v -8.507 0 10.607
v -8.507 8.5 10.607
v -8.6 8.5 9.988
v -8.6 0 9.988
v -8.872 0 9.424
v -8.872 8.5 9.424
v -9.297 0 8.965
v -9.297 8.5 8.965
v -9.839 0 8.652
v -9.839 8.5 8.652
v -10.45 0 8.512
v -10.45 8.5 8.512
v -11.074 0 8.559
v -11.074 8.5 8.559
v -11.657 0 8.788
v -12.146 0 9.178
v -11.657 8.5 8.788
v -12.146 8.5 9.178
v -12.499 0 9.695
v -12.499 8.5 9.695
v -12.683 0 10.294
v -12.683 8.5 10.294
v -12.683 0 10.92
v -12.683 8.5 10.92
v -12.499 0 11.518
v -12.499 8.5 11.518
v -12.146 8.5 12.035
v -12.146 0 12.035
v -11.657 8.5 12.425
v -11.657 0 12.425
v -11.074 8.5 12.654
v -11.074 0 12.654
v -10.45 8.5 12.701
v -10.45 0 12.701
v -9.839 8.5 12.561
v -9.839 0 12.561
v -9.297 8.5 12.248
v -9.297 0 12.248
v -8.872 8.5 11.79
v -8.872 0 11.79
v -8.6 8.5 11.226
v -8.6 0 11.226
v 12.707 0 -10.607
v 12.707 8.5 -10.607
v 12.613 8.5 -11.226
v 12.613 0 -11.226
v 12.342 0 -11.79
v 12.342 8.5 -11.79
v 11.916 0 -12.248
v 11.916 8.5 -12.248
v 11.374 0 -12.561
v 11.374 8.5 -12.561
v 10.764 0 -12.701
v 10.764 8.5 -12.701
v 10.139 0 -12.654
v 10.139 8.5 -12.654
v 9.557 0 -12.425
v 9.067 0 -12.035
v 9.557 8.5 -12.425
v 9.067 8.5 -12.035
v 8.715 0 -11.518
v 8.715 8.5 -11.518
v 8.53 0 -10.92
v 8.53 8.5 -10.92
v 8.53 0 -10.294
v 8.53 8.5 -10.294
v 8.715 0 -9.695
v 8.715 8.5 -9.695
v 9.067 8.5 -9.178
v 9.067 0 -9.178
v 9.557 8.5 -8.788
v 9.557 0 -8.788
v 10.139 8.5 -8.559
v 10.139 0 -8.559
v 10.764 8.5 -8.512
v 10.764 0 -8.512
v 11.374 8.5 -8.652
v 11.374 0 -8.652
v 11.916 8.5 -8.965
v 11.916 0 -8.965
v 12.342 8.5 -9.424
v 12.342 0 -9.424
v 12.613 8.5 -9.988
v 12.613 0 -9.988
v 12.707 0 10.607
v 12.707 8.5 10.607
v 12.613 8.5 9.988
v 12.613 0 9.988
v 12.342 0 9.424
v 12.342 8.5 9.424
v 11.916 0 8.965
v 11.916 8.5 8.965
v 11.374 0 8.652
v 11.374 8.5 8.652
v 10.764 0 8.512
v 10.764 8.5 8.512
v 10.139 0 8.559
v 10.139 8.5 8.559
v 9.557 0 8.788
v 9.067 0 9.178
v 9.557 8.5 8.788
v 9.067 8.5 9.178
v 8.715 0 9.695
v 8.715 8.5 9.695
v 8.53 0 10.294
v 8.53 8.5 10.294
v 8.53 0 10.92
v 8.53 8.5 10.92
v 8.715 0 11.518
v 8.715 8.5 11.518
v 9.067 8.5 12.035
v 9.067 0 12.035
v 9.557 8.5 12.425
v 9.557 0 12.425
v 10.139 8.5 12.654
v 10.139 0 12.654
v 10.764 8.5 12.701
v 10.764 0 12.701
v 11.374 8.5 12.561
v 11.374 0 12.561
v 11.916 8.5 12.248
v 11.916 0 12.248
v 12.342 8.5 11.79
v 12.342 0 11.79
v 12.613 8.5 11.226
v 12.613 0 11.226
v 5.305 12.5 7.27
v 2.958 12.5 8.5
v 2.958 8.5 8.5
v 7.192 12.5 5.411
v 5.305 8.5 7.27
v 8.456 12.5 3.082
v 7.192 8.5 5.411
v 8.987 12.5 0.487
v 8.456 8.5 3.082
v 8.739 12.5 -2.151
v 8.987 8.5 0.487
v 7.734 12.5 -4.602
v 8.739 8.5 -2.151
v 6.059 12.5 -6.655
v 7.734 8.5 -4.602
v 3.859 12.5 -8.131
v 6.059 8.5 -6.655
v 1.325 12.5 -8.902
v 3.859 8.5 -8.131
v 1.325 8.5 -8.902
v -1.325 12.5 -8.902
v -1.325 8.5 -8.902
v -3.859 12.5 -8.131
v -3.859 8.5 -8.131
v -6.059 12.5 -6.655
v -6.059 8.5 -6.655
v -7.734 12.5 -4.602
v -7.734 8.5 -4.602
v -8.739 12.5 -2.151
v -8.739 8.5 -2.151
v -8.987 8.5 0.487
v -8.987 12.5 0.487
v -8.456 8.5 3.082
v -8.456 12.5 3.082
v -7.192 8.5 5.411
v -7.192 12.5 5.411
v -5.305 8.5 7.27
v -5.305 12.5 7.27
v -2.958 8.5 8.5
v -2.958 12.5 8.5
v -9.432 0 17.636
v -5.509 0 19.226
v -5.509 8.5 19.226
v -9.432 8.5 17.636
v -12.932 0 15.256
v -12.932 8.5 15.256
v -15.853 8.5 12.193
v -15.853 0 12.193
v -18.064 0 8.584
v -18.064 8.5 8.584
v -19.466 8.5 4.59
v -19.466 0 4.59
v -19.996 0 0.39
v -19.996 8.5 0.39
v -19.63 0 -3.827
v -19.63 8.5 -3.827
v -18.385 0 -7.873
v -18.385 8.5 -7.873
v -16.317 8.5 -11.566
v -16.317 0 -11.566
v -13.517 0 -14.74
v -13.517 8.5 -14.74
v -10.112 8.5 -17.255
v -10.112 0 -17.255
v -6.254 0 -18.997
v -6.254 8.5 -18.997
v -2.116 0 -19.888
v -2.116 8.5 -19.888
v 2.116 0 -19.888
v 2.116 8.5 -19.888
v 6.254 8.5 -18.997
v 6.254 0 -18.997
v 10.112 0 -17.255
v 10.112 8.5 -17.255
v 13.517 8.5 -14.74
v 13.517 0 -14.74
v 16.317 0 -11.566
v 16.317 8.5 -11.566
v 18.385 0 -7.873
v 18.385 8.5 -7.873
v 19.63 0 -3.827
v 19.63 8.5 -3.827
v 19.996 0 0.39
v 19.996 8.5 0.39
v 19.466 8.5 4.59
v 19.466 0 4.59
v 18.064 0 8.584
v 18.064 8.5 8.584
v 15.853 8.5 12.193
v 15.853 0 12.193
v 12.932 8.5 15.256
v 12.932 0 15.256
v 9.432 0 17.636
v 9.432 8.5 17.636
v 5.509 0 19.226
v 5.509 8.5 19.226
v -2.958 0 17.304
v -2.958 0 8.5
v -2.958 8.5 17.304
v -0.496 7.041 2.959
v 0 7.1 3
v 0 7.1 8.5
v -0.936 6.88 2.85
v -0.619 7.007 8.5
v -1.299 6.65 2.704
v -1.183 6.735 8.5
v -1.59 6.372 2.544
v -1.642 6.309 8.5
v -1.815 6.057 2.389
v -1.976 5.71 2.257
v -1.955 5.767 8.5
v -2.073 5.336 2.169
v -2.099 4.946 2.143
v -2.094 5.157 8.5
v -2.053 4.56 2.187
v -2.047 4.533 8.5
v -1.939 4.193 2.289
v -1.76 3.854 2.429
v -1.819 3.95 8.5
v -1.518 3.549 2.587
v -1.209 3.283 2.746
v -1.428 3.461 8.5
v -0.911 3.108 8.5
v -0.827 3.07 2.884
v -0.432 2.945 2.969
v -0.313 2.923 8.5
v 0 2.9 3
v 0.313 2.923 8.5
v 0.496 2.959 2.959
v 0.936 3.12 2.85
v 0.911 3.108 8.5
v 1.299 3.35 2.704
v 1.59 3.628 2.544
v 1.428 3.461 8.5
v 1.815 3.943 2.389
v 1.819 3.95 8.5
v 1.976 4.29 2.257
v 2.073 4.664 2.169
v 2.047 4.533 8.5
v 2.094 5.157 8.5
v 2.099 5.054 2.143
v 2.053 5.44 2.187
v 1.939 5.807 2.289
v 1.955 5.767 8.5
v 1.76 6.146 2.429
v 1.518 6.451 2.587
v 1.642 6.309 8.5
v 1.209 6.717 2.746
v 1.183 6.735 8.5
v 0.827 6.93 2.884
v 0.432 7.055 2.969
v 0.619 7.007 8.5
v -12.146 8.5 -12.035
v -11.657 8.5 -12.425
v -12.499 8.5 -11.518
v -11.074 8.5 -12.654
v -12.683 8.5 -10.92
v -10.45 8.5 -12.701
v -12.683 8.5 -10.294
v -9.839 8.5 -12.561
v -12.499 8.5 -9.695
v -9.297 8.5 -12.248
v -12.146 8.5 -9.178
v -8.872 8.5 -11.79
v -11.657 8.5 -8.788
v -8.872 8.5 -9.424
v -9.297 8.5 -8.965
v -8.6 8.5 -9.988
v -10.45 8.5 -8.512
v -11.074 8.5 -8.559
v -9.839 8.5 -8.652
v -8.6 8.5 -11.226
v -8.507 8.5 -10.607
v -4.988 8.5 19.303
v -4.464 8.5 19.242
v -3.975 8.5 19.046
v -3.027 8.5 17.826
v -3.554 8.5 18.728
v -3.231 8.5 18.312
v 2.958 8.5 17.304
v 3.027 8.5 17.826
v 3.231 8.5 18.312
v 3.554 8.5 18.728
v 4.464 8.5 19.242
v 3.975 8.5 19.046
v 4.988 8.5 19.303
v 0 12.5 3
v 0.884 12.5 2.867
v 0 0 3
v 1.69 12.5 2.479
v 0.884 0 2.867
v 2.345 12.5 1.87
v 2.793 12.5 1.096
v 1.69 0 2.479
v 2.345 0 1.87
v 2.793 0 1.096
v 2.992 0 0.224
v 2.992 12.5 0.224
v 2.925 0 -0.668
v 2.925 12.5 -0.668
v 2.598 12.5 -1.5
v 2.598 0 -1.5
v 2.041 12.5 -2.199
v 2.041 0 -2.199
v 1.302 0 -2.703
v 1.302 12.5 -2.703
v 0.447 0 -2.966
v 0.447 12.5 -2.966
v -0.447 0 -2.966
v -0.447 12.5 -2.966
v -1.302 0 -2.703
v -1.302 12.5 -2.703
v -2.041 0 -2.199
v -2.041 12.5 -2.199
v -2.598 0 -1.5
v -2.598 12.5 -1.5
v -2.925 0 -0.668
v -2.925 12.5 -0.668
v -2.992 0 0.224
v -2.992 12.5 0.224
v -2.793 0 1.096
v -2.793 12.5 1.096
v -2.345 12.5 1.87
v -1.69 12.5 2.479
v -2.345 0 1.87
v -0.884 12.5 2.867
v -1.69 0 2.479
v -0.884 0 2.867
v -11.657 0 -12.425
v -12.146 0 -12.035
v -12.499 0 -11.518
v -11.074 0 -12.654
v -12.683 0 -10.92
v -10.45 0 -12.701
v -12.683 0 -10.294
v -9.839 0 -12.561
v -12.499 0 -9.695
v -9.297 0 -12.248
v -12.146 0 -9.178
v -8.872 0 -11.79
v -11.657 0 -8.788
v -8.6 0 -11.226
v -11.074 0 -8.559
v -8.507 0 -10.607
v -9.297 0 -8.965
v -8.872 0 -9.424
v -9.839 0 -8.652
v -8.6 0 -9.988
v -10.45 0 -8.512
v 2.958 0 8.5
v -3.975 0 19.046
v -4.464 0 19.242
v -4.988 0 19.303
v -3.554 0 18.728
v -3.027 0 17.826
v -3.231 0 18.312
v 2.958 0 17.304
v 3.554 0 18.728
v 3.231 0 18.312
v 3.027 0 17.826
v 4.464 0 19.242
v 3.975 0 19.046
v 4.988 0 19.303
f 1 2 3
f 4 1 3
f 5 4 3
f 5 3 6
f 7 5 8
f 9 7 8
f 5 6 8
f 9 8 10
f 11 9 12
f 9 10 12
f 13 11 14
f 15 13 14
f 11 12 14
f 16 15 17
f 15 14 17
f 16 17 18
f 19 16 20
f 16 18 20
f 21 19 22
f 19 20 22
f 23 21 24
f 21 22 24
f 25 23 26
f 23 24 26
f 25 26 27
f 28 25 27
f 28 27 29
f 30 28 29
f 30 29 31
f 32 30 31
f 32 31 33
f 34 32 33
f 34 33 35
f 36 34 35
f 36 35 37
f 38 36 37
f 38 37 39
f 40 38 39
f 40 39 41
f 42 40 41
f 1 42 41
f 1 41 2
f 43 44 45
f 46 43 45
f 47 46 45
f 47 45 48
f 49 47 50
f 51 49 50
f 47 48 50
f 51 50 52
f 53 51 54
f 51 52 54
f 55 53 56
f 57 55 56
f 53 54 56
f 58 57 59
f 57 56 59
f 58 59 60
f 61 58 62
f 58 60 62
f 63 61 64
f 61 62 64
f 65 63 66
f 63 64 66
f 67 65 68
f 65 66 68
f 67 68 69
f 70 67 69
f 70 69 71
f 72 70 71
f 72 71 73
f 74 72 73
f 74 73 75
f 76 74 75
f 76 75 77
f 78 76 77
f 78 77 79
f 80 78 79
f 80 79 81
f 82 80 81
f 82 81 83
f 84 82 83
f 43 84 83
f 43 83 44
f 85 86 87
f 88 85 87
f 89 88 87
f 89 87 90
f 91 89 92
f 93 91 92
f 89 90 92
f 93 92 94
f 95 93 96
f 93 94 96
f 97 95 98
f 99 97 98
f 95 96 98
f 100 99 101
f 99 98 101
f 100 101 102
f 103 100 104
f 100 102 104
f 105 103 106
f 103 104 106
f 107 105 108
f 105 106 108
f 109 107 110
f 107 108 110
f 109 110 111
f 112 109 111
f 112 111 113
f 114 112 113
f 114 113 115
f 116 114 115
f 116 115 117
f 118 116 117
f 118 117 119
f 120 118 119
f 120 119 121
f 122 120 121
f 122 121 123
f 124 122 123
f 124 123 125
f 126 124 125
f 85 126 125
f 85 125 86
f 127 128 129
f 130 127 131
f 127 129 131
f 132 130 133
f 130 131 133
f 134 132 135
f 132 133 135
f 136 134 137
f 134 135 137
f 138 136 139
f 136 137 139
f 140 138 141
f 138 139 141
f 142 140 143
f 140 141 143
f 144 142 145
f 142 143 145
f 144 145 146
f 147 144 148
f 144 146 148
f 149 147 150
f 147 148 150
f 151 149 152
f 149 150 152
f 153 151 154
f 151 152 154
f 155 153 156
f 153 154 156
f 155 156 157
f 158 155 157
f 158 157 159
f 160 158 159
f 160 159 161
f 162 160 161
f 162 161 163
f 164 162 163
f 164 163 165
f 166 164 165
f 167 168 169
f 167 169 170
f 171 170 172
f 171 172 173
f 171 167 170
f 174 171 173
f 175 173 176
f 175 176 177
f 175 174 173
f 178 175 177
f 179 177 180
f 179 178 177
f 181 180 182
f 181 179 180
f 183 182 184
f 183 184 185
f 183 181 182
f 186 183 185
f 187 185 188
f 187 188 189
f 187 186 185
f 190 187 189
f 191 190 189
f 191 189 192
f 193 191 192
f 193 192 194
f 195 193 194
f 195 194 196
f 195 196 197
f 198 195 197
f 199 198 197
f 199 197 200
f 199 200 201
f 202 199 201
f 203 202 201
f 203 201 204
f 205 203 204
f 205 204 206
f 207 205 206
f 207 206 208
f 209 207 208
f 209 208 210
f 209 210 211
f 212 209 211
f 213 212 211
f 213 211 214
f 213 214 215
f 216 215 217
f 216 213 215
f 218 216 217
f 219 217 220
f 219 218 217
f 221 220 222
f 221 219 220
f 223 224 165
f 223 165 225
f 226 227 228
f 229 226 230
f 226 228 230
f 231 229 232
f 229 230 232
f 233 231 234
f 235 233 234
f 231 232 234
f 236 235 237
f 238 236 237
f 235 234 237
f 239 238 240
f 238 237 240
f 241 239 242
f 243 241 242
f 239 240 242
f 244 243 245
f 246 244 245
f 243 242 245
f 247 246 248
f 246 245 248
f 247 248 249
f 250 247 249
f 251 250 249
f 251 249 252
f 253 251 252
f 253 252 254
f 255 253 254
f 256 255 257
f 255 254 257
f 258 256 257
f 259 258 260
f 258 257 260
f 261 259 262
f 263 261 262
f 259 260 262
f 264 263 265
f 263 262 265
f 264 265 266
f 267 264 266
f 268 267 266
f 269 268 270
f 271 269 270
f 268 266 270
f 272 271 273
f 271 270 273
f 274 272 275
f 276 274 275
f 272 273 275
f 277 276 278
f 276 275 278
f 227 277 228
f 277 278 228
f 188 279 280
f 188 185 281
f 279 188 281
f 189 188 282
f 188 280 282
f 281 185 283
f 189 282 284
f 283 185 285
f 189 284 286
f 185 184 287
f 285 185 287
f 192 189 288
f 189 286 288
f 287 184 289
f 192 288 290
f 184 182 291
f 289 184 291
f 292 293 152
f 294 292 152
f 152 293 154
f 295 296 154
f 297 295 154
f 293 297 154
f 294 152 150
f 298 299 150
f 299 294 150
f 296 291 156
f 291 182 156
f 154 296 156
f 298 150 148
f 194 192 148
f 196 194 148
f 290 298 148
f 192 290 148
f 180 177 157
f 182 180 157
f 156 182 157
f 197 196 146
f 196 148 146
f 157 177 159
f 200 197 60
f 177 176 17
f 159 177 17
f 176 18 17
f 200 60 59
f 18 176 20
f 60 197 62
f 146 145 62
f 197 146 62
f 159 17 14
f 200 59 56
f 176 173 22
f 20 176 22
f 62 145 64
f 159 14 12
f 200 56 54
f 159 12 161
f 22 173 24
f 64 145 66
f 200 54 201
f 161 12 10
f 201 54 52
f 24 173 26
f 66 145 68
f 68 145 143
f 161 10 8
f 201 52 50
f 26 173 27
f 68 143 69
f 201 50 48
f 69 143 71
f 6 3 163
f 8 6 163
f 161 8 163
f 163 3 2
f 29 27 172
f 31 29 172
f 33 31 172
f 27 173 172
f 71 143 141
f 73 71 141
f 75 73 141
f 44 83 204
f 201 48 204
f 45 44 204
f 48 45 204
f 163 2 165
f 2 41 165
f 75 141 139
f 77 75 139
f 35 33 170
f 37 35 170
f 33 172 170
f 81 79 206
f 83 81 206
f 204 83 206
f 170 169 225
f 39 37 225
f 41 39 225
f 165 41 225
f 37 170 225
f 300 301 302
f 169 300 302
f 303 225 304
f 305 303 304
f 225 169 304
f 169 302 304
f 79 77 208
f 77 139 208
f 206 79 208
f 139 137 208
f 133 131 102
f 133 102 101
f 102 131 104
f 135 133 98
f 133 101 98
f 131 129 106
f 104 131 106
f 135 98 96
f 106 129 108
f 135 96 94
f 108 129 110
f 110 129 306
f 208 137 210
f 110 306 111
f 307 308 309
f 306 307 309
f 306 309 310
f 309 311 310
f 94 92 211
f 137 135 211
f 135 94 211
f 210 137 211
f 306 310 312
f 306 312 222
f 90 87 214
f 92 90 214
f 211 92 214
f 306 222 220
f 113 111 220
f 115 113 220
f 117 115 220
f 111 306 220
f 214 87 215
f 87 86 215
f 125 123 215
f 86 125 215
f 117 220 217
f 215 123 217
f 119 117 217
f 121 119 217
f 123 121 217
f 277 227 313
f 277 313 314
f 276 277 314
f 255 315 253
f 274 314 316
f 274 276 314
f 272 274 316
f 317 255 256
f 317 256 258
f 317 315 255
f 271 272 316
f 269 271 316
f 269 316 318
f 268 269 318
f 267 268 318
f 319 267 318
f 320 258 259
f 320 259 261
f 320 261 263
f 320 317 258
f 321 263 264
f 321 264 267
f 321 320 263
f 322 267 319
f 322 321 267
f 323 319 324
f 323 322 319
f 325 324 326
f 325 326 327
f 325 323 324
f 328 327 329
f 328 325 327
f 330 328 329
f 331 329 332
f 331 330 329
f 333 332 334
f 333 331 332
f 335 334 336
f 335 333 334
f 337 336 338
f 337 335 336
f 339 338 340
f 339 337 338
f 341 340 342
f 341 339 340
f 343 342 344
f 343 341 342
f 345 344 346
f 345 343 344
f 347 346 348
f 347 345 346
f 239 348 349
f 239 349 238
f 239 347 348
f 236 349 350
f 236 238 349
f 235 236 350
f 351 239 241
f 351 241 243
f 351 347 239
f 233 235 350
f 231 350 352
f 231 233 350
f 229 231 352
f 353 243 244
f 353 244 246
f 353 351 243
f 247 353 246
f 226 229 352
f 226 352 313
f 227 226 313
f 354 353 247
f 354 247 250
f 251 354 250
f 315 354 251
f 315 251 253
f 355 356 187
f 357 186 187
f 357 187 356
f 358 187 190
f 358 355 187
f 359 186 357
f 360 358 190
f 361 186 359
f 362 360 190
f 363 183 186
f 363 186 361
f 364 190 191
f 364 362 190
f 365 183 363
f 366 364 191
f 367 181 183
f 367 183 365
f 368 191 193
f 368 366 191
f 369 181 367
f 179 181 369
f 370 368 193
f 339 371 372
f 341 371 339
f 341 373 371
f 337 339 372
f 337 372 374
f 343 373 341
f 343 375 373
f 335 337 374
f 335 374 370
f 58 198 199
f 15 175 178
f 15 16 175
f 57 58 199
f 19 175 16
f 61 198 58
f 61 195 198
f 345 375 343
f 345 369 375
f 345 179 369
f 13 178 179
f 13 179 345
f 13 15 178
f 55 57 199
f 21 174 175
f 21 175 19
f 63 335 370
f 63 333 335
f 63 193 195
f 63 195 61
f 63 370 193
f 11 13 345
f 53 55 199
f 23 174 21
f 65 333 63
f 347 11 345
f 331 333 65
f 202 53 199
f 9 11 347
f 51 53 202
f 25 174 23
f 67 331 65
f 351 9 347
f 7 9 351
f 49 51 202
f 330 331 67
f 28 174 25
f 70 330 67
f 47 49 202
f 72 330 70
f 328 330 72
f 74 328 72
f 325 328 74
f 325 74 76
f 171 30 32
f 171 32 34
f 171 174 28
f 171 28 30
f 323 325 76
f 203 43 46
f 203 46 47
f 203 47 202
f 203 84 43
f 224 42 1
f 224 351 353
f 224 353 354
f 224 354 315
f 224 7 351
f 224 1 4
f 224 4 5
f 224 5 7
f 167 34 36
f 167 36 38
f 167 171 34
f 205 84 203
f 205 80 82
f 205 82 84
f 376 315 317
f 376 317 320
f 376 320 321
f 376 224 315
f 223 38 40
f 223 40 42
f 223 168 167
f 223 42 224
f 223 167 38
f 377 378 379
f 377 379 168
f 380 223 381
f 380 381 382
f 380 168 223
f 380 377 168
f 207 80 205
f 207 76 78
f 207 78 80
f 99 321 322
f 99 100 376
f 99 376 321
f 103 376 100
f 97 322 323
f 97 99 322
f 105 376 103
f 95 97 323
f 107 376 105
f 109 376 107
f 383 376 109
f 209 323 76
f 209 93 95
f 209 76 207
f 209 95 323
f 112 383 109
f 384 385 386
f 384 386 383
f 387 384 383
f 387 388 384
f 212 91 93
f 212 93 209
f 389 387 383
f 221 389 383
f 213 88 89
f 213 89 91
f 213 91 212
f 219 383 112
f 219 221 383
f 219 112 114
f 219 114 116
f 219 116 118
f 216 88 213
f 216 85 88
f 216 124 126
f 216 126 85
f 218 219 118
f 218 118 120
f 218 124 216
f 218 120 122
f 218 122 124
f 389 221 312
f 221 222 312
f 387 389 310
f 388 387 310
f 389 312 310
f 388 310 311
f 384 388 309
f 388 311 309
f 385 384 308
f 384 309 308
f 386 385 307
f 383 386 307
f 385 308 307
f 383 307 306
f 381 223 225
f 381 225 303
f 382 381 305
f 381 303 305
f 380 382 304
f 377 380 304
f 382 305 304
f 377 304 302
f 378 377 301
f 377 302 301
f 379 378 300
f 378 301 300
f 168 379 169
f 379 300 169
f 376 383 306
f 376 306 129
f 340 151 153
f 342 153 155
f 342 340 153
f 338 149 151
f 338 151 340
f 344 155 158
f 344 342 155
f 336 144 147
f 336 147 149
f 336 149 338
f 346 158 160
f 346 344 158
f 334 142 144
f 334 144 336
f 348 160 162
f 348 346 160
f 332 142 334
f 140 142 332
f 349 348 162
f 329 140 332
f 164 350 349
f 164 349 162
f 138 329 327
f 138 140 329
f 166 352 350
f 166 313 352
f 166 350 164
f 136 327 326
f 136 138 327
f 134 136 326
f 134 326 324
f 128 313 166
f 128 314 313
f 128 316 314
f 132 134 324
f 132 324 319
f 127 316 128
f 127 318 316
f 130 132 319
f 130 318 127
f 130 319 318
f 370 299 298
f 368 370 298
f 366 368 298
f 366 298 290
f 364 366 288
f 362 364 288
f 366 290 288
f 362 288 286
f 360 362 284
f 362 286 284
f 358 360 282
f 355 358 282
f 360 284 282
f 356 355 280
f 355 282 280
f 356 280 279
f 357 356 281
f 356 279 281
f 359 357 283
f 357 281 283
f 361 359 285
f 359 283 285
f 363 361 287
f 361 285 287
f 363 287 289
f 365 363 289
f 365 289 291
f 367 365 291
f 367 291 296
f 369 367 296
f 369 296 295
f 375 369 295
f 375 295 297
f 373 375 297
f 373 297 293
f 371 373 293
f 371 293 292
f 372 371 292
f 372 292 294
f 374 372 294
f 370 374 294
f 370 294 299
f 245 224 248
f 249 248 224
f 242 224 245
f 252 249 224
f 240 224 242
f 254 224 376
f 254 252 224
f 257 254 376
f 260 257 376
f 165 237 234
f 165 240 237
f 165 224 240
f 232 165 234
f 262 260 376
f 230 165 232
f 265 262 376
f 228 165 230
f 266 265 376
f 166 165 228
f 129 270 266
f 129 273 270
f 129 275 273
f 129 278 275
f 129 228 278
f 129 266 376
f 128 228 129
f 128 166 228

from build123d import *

# Parameters (mm, degrees)
SKETCH1_R                  = 9
SKETCH1_R_2                = 3
BOSS_EXTRUDE1_DEPTH        = 12.5
SKETCH5_W                  = 2.1
SKETCH5_H                  = 9
CUT_EXTRUDE1_START         = 9
SKETCH6_W                  = 18
SKETCH6_H                  = 12.5
CUT_EXTRUDE1_DEPTH         = 0.5
BOSS_EXTRUDE2_DEPTH        = 8.5
FILLET1_R                  = 2
F_4_2_4_2_DIAMETER_HOLE2_D = 4.2


with BuildPart() as part:
    # Sketch1 → Boss-Extrude1 (new body)
    with BuildSketch(Plane(origin=(0, 0, 0), x_dir=(1, 0, 0), z_dir=(0, 1, 0))):
        with Locations(Location((0, 0, 0), (0, 0, 270))):
            Circle(SKETCH1_R)
        with Locations(Location((0, 0, 0), (0, 0, 270))):
            Circle(SKETCH1_R_2, mode=Mode.SUBTRACT)
    extrude(amount=BOSS_EXTRUDE1_DEPTH)

    # Sketch5 → Ø4.2 (4.2) Diameter Hole1 (revolve, cut)
    with BuildSketch(Plane(origin=(0, 5, 0), x_dir=(0, 1, 0), z_dir=(1, 0, 0))):
        with Locations((1.05, 4.5)):
            Rectangle(SKETCH5_W, SKETCH5_H)
    revolve(axis=Axis((0, 5, -6.35), (0, 0, 1)), mode=Mode.SUBTRACT)

    # Sketch6 → Cut-Extrude1 (cut)
    with BuildSketch(Plane.XY.offset(CUT_EXTRUDE1_START)):
        with Locations((0, 6.25)):
            Rectangle(SKETCH6_W, SKETCH6_H)
    extrude(amount=-CUT_EXTRUDE1_DEPTH, mode=Mode.SUBTRACT)

    # Sketch7 → Boss-Extrude2 (add)
    with BuildSketch(Plane.XZ):
        with BuildLine():
            Line((-2.958039892, 8.5), (-2.958039892, 19.780040445))
            ThreePointArc((-2.958039892, 19.780040445), (0, -20), (2.958039892, 19.780040445))
            Line((2.958039892, 19.780040445), (2.958039892, 8.5))
            ThreePointArc((2.958039892, 8.5), (0, -9), (-2.958039892, 8.5))
        make_face()
    extrude(amount=-BOSS_EXTRUDE2_DEPTH)

    # Fillet1
    fillet1_edges = [part.edges().sort_by_distance(p)[0] for p in [
        (-2.958039892, 4.25, 19.780040445),
        (2.958039892, 4.25, 19.780040445),
    ]]
    fillet(fillet1_edges, radius=FILLET1_R)

    # Ø4.2 (4.2) Diameter Hole2 (through all)
    with Locations(Plane(origin=(0, 0, 0), x_dir=(-1, 0, 0), z_dir=(0, -1, 0))):
        with Locations((10.606601718, -10.606601718), (-10.606601718, -10.606601718), (-10.606601718, 10.606601718), (10.606601718, 10.606601718)):
            Hole(F_4_2_4_2_DIAMETER_HOLE2_D / 2)


solid = part.part
